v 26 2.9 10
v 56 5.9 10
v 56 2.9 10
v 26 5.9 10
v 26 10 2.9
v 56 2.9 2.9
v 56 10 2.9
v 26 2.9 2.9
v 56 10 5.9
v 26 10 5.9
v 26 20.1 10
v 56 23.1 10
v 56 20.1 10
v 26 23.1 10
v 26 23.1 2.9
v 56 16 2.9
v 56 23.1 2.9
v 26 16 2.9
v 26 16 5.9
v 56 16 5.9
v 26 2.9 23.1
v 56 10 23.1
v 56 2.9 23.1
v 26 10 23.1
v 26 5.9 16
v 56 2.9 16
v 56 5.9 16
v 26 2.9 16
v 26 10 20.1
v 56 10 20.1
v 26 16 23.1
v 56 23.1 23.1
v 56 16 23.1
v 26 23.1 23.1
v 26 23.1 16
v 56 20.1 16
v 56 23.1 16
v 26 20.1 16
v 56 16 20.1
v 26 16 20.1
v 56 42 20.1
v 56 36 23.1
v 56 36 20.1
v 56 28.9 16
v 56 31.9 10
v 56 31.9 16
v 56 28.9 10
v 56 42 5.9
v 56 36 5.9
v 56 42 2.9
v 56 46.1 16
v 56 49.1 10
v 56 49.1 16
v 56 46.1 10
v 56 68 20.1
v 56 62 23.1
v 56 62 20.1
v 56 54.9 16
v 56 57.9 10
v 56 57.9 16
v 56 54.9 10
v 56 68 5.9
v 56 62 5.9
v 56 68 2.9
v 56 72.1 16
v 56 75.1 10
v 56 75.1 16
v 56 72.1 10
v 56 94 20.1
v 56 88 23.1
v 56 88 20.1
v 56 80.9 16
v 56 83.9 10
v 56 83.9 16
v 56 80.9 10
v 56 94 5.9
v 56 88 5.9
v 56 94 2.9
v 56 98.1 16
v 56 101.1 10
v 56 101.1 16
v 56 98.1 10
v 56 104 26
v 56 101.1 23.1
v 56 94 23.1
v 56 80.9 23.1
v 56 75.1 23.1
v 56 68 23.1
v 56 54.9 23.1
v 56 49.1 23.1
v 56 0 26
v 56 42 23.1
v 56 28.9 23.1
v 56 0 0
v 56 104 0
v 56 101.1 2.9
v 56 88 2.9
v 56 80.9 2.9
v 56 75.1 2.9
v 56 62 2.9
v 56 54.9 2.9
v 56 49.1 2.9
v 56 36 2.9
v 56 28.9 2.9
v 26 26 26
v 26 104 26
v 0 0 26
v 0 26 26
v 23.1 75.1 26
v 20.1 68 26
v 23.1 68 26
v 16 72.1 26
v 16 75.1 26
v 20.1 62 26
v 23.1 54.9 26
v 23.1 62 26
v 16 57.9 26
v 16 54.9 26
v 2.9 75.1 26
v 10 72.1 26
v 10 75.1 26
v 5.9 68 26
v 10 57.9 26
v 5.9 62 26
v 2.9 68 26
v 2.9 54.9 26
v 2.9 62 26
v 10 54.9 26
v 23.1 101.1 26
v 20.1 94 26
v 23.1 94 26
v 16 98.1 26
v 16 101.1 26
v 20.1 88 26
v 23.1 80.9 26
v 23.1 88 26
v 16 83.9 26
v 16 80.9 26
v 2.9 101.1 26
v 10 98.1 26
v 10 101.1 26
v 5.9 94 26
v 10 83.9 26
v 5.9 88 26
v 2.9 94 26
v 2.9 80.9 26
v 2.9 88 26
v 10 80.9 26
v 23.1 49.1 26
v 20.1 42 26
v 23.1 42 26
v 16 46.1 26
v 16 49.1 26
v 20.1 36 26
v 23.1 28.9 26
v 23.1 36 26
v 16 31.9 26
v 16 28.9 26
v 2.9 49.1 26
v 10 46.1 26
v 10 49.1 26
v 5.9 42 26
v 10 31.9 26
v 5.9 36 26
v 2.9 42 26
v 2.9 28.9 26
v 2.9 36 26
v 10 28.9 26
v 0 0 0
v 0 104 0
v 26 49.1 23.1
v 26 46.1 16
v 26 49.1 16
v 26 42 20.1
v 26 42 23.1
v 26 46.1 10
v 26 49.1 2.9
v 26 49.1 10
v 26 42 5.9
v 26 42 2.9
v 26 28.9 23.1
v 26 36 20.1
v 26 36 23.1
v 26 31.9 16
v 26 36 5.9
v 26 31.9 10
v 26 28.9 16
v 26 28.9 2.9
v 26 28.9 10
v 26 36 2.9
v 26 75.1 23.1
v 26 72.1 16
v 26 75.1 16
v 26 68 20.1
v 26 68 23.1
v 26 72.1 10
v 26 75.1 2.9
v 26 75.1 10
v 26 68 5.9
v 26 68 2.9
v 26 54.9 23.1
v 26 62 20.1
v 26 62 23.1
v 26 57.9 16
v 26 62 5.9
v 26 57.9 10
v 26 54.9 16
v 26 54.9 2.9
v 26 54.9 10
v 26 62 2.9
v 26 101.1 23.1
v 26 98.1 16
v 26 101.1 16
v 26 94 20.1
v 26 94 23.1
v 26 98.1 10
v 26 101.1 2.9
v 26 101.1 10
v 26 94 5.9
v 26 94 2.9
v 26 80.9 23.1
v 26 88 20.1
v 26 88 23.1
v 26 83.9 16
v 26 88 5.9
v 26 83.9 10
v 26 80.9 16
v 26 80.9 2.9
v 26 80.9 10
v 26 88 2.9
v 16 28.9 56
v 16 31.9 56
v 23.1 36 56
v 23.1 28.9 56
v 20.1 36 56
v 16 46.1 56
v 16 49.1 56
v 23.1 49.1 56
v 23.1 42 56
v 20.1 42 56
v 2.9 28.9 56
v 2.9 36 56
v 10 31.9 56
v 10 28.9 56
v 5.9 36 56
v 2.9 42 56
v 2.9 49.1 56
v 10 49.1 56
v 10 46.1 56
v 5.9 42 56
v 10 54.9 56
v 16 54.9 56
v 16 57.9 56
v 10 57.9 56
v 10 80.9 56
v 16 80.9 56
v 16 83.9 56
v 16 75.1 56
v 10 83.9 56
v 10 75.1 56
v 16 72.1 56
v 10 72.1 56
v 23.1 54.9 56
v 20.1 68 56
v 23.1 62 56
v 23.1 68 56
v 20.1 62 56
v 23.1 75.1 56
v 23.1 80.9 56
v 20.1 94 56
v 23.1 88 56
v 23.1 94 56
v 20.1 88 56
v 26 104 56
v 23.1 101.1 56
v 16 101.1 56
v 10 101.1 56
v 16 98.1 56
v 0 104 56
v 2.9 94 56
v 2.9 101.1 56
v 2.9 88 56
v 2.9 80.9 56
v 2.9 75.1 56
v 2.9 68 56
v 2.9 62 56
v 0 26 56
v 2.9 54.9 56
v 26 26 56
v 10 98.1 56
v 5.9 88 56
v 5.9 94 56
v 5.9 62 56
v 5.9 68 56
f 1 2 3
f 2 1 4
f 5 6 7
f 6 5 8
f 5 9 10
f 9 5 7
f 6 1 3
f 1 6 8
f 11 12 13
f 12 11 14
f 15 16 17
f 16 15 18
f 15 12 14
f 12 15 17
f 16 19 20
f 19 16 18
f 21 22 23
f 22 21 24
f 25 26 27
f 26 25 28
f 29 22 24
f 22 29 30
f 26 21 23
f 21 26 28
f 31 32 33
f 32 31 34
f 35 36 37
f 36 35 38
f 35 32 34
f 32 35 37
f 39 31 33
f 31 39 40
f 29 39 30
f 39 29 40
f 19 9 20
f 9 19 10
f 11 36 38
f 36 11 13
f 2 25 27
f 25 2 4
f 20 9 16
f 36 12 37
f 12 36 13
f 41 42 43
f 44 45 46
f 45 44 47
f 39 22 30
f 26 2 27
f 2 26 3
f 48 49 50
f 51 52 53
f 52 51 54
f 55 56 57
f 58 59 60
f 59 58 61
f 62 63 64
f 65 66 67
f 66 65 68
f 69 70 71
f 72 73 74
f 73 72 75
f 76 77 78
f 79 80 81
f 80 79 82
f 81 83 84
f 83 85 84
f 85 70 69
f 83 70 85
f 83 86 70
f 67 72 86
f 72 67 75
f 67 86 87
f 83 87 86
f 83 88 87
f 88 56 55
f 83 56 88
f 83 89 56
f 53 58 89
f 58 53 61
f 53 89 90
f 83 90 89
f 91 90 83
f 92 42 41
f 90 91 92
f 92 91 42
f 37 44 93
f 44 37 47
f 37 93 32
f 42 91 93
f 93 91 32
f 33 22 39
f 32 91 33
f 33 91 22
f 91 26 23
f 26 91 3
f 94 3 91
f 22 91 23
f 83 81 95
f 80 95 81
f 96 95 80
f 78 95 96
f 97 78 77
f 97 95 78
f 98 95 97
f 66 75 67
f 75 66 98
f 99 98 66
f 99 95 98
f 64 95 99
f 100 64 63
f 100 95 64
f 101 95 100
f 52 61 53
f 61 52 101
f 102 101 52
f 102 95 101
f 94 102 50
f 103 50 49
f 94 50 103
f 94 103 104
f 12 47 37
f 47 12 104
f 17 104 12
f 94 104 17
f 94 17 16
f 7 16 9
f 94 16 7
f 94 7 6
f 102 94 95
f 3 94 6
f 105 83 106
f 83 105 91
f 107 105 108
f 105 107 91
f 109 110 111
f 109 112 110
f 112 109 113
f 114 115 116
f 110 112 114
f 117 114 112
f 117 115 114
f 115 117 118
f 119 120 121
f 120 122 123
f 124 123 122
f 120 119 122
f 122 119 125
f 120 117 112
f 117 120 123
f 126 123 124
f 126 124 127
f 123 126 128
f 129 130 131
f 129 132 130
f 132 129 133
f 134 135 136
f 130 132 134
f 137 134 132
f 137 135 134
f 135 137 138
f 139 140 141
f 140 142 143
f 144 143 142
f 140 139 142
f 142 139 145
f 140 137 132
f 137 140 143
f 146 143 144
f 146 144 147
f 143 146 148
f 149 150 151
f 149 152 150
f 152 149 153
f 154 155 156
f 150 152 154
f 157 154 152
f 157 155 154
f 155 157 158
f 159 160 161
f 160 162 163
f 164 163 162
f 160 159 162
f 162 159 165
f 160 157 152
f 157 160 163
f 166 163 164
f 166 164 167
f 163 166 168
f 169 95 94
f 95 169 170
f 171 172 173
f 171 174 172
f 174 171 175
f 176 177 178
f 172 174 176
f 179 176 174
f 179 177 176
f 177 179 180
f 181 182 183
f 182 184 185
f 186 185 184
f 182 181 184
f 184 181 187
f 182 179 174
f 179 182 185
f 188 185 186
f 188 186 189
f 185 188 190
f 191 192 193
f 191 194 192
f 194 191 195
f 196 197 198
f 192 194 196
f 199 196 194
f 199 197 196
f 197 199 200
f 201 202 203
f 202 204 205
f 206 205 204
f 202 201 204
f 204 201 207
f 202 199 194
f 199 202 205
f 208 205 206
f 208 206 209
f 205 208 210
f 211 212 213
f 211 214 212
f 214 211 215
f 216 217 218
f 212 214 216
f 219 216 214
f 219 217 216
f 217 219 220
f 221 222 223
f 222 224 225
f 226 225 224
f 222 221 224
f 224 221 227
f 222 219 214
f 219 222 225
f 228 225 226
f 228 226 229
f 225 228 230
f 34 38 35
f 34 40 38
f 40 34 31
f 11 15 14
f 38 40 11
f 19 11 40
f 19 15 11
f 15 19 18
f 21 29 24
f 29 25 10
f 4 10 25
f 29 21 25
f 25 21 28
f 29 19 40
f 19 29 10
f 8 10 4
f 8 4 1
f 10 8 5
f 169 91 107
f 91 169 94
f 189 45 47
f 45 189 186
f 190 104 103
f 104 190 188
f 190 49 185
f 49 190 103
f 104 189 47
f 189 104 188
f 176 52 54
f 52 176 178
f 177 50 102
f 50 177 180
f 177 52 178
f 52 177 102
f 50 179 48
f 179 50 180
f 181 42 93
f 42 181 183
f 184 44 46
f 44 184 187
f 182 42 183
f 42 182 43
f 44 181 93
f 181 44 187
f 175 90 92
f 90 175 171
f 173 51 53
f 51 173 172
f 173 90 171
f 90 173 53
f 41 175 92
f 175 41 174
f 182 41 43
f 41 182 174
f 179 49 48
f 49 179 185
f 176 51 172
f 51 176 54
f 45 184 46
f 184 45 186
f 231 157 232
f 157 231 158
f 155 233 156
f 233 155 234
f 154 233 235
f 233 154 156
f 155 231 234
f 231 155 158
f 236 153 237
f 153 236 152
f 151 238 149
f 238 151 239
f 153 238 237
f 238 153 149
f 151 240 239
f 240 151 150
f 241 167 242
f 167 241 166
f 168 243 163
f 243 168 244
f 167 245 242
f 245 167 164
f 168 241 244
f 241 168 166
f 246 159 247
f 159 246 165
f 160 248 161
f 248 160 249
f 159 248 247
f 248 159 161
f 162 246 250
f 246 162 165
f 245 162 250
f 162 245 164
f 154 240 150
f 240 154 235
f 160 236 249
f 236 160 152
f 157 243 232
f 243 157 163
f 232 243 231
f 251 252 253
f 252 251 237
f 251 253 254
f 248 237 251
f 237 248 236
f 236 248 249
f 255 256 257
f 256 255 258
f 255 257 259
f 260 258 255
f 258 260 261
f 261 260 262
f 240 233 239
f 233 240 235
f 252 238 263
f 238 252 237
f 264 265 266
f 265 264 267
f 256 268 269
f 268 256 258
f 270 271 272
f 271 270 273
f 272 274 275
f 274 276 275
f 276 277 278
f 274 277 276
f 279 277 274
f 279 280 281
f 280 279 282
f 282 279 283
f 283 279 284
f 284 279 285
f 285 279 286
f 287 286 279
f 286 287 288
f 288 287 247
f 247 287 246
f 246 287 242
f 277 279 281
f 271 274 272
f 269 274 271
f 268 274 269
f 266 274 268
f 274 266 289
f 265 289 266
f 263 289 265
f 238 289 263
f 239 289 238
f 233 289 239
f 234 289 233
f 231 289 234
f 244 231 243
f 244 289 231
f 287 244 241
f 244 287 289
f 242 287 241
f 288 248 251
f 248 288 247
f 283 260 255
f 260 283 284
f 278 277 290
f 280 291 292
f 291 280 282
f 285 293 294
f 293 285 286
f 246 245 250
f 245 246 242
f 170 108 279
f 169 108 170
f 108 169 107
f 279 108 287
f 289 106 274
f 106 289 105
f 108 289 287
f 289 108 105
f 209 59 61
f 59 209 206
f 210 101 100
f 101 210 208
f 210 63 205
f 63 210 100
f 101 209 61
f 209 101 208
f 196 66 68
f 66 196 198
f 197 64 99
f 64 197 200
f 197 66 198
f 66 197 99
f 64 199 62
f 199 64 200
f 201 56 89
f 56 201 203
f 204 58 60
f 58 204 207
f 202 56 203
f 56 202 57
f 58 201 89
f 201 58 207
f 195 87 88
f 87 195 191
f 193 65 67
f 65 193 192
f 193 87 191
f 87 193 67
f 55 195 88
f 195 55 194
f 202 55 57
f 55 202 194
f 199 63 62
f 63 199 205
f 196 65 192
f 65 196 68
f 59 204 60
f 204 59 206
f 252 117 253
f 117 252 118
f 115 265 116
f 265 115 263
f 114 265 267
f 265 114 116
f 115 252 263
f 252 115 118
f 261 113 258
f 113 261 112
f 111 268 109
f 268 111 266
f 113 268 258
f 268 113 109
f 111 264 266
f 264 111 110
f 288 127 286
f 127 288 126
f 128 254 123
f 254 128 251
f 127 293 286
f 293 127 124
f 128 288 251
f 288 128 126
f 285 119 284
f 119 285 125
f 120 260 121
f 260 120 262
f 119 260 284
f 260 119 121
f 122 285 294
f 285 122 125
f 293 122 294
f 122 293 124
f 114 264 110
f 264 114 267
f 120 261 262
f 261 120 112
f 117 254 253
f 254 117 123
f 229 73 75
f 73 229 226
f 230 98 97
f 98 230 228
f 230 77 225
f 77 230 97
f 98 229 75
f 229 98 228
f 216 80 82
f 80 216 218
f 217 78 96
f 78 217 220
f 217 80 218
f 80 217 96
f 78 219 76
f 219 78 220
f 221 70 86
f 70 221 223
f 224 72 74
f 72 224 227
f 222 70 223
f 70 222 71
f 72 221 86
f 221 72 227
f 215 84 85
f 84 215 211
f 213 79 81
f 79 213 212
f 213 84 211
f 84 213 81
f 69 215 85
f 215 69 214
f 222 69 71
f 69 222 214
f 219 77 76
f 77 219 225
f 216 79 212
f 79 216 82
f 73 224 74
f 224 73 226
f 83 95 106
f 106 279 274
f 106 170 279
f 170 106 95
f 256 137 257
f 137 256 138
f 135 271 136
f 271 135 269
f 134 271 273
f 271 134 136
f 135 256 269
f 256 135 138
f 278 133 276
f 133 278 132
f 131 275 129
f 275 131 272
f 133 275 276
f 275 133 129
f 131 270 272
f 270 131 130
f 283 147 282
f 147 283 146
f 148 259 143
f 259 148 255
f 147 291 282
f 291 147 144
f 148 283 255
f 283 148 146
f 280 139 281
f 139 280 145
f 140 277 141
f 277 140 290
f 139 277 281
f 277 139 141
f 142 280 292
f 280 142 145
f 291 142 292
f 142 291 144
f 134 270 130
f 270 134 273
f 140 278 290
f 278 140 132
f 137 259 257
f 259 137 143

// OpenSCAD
// file: modules_coin_0_4.scad
/* [Tips] */
// Length of the tips
tipsL = 30.0;  // [1,2,3,4,5,6,7,8,9,30]
// Width of the tips
tipsW = 26.0;

/* [Profiles] */
// Width of the profiles
profilesW = 20.2;

/* [Blocs] */
// Length of the blocs
blocsL = 6;
// Width of the blocs
blocsW = 3;

/* [Hidden] */

// to avoid "z fighting" where surfaces line up exactly, add a bit of fudge
fudge = 0.1;

module void_profile(
    length,         // Length of the profile
    width = 20,     // Width of the profile
    blocL = 6,      // Lenght of the bloc
    blocW = 3,      // Width of the bloc
    fudge = 0.1)    // 
{
    step = (width - blocL)/2;
    
    // Bottom-left hole
    translate([-fudge,0,0])             
    cube([length+2*fudge,step,step]);

    // Bottom-rigth hole
    translate([-fudge,step+blocL,0])    
    cube([length+2*fudge,step,step]);

    // Top-left hole
    translate([-fudge,0,step+blocL])
    cube([length+2*fudge,step,step]);

    // Top-rigth hole
    translate([-fudge,step+blocL,step+blocL])
    cube([length+2*fudge,step,step]);

    // Middle hole
    translate([-fudge,blocW,blocW])
    cube([length+2*fudge,width-2*blocW,width-2*blocW]);
}

module tip_profile(
    tipL,           // Length of the tip
    tipW,           // Width of the tip
    profileW,       // Width of the profile
    blocL,          // Length of the bloc
    blocW,          // Width of the bloc
    fudge=0.1)        // 
{
    difference()
    {
        // The tip
        color("blue")
        cube([tipL, tipW, tipW]);
        
        color("red")
        translate([0, (tipW-profileW)/2, (tipW-profileW)/2])
        void_profile(tipL+fudge, profileW, blocL, blocW, fudge);
    }
}

union()
{
    //color("green")
    //cube(tipsW);

    //translate([tipsW, 0, 0])
    tip_profile(tipsL, tipsW, profilesW, blocsL, blocsW, fudge);
}
// main file
use <modules_coin_0_4.scad>

/* [Corner] */
// Number of arcs
nbArc = 3;

/* [Tips] */
// Length of the tips
tipsL = 30.0;  // [1,2,3,4,5,6,7,8,9,30]
// Width of the tips
tipsW = 26.0;

/* [Profiles] */
// Width of the profiles
profilesW = 20.2;

/* [Blocs] */
// Length of the blocs
blocsL = 6;
// Width of the blocs
blocsW = 3;

/* [Hidden] */

// to avoid "z fighting" where surfaces line up exactly, add a bit of fudge
fudge = 0.1;
union()
{
    color("yellow")
    cube([tipsW, tipsW*(nbArc+1), tipsW]);

    for (i = [0:1:nbArc])
    {
        translate([tipsW, i*tipsW, 0])
        tip_profile(tipsL, tipsW, profilesW, blocsL, blocsW, fudge);
        
        if (i != 0)
        {
            translate([tipsW, i*tipsW, tipsW])
            rotate([0,-90,0])
            tip_profile(tipsL, tipsW, profilesW, blocsL, blocsW, fudge);
        }
    }
}
